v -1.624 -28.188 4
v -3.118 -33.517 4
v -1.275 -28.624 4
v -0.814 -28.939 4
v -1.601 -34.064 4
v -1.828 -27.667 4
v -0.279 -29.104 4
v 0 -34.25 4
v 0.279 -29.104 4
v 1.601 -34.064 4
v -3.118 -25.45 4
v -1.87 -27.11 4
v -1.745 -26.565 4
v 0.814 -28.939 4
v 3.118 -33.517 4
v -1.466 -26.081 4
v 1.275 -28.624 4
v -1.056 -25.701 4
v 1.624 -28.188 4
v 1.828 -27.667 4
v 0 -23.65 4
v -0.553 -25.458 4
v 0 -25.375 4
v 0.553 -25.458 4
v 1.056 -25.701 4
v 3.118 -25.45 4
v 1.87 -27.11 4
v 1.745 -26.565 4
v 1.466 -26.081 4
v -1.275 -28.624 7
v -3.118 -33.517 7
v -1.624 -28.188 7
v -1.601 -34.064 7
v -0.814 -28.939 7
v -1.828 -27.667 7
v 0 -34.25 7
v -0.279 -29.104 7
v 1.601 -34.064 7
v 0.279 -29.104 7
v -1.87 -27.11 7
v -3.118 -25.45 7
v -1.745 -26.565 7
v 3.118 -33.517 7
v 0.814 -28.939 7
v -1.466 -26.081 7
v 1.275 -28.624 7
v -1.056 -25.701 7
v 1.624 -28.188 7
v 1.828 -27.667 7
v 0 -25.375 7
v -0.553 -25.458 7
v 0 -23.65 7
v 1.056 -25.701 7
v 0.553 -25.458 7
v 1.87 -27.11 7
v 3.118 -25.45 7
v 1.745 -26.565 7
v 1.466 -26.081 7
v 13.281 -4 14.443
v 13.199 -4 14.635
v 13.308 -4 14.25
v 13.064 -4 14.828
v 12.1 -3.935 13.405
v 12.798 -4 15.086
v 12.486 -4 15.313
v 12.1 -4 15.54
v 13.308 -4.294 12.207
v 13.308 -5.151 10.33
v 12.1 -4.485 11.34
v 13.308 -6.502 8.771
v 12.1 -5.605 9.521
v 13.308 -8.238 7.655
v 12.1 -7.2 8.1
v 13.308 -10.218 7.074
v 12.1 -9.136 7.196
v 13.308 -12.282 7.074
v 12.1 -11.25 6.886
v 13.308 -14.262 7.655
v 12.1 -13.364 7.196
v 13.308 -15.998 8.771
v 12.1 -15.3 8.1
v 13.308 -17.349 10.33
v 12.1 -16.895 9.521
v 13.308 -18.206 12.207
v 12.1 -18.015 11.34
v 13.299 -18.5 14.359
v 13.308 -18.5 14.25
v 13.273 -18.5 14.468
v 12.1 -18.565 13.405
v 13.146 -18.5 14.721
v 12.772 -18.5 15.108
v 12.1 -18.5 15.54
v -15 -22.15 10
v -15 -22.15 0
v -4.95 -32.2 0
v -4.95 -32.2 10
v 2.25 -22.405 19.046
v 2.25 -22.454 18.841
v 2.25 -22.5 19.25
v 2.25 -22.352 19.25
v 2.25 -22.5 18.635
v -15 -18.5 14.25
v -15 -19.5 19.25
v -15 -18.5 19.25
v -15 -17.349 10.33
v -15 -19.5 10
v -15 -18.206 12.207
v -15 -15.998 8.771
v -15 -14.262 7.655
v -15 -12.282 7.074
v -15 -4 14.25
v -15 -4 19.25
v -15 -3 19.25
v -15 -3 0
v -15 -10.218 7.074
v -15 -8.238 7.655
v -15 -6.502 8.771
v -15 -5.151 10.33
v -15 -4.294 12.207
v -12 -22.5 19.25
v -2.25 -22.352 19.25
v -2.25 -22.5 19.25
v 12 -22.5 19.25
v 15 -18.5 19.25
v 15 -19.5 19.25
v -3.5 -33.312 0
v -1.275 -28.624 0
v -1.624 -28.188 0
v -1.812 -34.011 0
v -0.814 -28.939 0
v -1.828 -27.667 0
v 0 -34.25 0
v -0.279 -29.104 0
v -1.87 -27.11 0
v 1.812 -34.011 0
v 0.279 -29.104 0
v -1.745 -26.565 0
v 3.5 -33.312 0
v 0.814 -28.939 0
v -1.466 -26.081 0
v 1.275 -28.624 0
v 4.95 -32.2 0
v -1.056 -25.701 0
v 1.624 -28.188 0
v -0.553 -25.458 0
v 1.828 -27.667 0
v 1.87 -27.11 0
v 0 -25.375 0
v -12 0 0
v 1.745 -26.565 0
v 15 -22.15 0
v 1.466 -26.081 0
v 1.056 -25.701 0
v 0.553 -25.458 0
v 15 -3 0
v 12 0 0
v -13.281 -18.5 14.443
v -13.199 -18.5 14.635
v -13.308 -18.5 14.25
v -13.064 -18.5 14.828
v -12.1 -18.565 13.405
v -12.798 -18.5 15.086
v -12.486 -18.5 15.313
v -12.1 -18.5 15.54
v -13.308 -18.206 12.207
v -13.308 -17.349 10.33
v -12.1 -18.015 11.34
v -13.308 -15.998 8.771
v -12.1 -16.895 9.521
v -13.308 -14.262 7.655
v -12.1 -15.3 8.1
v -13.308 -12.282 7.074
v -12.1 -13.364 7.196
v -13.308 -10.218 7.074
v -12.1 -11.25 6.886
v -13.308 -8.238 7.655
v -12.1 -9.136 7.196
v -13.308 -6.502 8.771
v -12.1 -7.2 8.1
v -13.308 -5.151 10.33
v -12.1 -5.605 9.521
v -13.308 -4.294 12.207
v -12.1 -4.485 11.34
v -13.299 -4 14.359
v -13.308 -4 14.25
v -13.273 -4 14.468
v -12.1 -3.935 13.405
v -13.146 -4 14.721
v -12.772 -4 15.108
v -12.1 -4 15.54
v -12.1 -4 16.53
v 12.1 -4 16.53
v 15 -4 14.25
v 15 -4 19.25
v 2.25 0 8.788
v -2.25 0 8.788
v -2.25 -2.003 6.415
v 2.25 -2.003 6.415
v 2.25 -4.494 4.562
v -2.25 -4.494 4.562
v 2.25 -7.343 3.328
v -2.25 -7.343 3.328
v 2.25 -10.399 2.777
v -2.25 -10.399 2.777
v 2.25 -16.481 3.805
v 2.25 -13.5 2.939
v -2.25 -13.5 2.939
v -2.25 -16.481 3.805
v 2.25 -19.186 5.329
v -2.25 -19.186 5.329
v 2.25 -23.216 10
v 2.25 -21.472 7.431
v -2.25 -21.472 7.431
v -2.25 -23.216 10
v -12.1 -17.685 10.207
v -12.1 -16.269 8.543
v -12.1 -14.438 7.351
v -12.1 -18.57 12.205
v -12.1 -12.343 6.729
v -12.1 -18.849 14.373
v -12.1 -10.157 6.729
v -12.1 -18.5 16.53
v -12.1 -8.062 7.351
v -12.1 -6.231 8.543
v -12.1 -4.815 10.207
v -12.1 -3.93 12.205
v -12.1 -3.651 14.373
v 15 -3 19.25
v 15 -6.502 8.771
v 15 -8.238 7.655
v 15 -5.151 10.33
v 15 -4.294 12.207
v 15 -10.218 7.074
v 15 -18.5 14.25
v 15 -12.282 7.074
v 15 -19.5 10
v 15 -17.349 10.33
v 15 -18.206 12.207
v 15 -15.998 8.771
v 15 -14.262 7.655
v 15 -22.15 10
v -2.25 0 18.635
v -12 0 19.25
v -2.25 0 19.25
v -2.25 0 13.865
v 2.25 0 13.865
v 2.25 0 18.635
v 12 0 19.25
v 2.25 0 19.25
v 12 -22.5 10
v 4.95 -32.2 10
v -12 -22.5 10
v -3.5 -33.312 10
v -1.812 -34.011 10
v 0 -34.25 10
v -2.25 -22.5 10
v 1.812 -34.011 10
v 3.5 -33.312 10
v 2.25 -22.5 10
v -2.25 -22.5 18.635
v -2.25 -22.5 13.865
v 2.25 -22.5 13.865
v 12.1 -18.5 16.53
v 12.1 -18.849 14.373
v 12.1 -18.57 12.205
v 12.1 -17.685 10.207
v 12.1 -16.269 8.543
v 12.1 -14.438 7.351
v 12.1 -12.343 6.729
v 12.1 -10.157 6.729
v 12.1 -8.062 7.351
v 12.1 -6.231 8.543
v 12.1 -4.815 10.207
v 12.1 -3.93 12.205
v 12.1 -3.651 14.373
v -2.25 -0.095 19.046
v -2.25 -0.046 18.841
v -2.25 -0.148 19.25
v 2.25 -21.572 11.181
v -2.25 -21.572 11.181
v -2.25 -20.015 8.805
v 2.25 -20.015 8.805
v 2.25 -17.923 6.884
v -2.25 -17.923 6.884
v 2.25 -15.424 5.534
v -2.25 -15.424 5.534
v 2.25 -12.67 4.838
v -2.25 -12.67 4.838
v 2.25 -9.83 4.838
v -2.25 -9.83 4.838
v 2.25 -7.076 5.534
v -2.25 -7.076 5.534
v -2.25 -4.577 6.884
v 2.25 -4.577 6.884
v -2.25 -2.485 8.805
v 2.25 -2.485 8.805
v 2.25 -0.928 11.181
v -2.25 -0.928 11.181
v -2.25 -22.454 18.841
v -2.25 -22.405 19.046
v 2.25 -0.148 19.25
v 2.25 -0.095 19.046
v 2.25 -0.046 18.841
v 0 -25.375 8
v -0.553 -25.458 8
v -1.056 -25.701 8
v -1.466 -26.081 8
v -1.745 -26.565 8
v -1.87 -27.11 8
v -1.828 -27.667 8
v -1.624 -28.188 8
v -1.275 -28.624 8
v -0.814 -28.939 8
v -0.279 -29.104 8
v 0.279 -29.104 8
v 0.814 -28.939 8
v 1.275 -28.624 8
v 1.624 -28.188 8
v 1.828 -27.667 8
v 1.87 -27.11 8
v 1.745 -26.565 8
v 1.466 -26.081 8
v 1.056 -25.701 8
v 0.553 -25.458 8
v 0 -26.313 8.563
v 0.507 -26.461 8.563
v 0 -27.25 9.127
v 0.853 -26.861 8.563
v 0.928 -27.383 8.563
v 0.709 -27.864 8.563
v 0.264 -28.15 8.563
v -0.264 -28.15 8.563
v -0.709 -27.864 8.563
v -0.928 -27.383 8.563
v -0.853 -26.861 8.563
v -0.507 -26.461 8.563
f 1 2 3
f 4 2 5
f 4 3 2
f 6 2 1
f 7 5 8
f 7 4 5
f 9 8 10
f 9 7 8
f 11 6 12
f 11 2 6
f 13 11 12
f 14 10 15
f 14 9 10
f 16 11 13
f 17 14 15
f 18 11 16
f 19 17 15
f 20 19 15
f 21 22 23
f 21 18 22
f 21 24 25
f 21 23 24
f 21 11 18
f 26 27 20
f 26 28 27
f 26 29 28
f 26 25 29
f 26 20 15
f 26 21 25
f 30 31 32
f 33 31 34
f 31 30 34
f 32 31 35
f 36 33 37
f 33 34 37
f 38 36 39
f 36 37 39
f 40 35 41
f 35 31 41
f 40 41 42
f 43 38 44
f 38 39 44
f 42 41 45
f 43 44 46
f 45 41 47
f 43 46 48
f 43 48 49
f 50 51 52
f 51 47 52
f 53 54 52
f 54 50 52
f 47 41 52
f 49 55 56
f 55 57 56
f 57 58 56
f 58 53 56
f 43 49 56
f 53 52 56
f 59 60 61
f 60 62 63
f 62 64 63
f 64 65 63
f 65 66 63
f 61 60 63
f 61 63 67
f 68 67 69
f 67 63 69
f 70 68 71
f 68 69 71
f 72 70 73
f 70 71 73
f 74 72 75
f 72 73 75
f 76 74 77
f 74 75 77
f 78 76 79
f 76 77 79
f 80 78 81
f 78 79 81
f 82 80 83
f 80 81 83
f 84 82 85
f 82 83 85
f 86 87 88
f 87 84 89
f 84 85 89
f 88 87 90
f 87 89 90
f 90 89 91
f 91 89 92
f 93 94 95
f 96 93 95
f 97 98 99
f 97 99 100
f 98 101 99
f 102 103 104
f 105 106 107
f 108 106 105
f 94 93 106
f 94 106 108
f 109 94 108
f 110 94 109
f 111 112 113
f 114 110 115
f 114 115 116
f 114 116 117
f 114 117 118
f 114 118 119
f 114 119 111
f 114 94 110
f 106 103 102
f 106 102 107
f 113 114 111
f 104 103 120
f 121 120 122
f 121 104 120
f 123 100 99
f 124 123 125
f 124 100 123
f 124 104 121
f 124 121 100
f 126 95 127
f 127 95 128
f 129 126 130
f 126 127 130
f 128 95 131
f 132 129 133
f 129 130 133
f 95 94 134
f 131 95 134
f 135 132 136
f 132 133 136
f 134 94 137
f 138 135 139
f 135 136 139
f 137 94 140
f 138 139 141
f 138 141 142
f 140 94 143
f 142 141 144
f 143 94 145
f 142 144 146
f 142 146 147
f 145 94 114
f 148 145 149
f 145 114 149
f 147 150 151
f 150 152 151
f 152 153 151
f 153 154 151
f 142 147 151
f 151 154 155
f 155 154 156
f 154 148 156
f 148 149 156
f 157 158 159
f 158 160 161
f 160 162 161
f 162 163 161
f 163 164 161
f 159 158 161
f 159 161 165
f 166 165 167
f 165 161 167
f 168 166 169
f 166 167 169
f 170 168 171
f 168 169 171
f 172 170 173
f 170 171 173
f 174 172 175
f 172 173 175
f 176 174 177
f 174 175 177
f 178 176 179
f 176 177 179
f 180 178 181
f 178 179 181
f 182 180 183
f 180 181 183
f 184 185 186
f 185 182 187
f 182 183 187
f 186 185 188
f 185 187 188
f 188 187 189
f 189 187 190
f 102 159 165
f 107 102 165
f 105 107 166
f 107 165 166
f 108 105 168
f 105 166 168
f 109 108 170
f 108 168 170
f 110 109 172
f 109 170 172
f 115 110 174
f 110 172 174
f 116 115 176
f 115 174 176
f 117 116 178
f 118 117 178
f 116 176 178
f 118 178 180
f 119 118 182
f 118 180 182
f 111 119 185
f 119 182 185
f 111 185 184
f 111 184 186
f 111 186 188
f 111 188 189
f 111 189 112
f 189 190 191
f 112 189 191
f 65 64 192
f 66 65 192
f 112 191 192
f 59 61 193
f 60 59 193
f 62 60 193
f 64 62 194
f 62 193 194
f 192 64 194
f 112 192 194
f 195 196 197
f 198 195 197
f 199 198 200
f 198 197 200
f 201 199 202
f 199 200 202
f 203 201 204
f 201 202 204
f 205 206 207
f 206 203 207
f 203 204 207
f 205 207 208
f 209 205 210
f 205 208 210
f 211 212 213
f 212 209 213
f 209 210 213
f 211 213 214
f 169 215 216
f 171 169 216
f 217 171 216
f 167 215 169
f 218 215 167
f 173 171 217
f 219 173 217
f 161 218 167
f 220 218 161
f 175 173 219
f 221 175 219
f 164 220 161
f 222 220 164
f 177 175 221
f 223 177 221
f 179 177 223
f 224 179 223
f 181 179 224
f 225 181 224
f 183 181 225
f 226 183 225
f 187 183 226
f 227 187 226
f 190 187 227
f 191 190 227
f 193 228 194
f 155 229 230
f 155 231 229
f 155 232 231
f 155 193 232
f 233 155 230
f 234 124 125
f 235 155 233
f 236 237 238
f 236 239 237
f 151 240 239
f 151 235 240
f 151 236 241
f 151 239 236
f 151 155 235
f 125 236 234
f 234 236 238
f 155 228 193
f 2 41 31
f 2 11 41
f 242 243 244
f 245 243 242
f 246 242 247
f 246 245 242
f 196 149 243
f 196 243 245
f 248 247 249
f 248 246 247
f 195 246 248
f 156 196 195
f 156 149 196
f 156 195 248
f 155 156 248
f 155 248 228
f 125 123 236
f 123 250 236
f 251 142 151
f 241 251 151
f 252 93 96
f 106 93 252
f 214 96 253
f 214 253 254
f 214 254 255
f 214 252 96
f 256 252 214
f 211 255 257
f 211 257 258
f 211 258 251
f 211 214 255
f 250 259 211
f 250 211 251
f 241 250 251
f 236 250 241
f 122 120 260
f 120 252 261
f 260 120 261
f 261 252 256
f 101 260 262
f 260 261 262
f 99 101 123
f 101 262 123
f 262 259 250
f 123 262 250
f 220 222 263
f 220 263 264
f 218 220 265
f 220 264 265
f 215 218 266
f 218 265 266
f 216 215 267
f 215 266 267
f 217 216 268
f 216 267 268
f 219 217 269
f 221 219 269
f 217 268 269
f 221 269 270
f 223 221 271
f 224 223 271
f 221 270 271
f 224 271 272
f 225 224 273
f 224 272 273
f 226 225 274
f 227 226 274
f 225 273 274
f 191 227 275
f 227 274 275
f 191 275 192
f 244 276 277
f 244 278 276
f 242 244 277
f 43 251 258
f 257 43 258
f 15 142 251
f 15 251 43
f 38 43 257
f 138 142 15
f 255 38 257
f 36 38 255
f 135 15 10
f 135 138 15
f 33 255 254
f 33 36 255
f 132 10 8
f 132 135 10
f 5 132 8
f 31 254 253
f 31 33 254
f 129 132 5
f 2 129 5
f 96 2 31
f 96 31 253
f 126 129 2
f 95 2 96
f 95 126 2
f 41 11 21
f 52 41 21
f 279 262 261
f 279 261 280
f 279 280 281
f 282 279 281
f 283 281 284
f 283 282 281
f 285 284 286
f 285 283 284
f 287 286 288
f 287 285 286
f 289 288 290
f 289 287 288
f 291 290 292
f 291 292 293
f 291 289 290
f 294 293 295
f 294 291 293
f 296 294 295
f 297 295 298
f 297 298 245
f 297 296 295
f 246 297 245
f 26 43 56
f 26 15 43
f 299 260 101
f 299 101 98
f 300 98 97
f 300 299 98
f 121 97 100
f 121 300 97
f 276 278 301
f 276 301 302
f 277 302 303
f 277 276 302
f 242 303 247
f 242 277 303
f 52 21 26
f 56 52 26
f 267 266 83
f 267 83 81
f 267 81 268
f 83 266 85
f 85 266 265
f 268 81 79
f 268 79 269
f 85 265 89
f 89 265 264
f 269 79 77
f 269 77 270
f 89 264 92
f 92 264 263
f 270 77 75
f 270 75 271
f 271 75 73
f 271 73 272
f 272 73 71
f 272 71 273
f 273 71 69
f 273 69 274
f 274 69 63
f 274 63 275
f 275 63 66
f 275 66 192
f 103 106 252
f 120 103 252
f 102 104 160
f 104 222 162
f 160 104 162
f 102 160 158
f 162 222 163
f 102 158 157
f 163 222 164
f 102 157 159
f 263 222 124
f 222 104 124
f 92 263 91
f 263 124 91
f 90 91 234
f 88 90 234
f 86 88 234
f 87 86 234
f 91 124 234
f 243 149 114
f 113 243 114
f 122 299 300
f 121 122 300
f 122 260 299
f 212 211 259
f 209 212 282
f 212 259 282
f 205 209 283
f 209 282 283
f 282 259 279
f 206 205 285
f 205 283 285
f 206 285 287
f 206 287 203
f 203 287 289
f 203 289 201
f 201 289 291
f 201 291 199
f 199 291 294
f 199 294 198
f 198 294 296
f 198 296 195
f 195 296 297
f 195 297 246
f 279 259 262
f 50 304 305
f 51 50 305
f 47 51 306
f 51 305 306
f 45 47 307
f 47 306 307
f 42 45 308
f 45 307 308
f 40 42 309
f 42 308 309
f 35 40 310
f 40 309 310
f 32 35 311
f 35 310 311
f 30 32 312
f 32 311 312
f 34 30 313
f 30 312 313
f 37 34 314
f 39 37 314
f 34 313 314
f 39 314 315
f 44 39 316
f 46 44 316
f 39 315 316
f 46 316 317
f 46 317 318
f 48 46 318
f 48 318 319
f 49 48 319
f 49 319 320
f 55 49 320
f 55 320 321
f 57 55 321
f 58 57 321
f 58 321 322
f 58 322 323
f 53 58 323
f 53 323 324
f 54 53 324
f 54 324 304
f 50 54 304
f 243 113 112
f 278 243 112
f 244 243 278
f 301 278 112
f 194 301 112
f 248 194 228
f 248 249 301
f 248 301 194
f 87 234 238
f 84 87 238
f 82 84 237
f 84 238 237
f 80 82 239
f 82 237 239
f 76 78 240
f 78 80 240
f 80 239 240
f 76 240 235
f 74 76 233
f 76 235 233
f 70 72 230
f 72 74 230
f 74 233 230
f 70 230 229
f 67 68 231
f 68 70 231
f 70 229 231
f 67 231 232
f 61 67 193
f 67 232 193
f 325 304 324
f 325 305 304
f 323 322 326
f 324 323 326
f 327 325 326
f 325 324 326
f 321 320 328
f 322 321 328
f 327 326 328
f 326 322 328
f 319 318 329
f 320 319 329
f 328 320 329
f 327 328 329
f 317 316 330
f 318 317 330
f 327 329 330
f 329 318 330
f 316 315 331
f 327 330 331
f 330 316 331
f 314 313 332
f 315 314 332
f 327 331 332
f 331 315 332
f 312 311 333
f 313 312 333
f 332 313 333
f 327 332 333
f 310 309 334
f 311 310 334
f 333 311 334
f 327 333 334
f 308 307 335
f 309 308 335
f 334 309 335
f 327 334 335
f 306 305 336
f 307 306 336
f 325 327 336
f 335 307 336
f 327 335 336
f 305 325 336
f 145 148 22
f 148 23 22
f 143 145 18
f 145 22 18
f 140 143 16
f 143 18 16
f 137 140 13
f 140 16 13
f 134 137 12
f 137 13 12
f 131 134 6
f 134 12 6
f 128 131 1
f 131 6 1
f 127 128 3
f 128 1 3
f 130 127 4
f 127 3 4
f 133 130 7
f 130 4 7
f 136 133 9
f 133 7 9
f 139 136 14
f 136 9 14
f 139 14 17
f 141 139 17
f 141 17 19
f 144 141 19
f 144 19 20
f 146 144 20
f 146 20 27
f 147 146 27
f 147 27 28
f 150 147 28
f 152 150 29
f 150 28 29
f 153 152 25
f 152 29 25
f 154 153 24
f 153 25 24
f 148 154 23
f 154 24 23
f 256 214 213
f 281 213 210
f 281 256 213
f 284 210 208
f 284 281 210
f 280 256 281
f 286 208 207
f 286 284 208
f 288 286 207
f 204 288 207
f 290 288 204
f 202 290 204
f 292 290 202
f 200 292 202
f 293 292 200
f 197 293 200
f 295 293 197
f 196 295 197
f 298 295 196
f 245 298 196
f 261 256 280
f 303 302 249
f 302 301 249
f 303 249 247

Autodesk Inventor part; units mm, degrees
sketch "Boceto1" plane through (0, 0, 0) normal (0, 0, 1) x (1, 0, 0)
  line L0 (-12, 0) -> (12, 0)
  line L1 (15, -3) -> (15, -22.1495)
  line L2 (-15, -22.1495) -> (-15, -3)
  line L3 (12, 0) -> (15, -3)
  line L4 (-12, 0) -> (-15, -3)
  line L5 (-15, -22.1495) -> (-4.9497, -32.1997)
  arc A0 (-4.9497, -32.1997) -> (4.9497, -32.1997) centre (0, -27.25) ccw
  line L6 (4.9497, -32.1997) -> (15, -22.1495)
  point P0 (0, 0)
  point P1 (-15, 0)
  point P2 (15, 0)
  point P3 (0, 0)
  point P4 (0, -34.25)
  point P5 (15, 0)
  point P6 (0, -34.25)
  dimension "d0" = 30
  dimension "d5" = 3
  dimension "d6" = 3
  dimension "d10" = 135
  dimension "d55" = 27.25
  dimension "d59" = 7
  dimension "d60" = 34.25
extrude "Extrusión1" add sketch "Boceto1" along normal blind 10
sketch "Boceto2" plane through (0, 0, 10) normal (0, 0, 1) x (1, 0, 0)
  line L0 (15, -22.1495) -> (15, -3) projected
  line L1 (15, -3) -> (12, 0) projected
  line L2 (12, 0) -> (-12, 0) projected
  line L3 (-12, 0) -> (-15, -3) projected
  line L4 (-15, -3) -> (-15, -22.1495) projected
  line L5 (-15, -22.1495) -> (-4.9497, -32.1997) projected
  arc A0 (-4.9497, -32.1997) -> (4.9497, -32.1997) centre (0, -27.25) ccw projected
  line L6 (4.9497, -32.1997) -> (15, -22.1495) projected
  line L7 (-15, -19.5) -> (-12, -22.5)
  line L8 (-12, -22.5) -> (12, -22.5)
  line L9 (12, -22.5) -> (15, -19.5)
  point P0 (0, 0)
  dimension "d13" = 3
  dimension "d14" = 3
  dimension "d15" = 3
  dimension "d16" = 3
  dimension "d17" = 22.5
extrude "Extrusión2" add sketch "Boceto2" along normal blind 9.25 contours L9 L8 L7 L4 L3 L2 L1 L0
sketch "Boceto3" plane through (15, -22.1495, 0) normal (1, 0, 0) x (0, 0, -1)
  line L0 (-19.25, 2.6495) -> (-19.25, 19.1495) projected
  line L1 (-19.25, 19.1495) -> (-19.25, 2.6495) projected
  line L2 (-19.25, 3.6495) -> (-14.25, 3.6495)
  arc A0 (-14.25, 3.6495) -> (-14.25, 18.1495) centre (-14.25, 10.8995) ccw
  line L3 (-14.25, 18.1495) -> (-19.25, 18.1495)
  point P0 (0, 22.1495)
  point P1 (-7, 10.8995)
  point P2 (-19.25, 10.8995)
  dimension "d20" = 12.25
  dimension "d21" = 14.5
extrude "Extrusión3" cut sketch "Boceto3" against normal through all
hole "Agujero1" at (0, -27.25, 0) direction (0, 0, 1) diameter 3.75 depth 8 tip angle 118
ref_plane "Plano de trabajo1" through (0, 0, 4) normal (0, 0, 1) x (1, 0, 0)
sketch "Boceto4" plane through (0, 0, 4) normal (0, 0, 1) x (1, 0, 0)
  circle A0 centre (0, -27.25) radius 1.875 projected
  line L0 (0, -23.6502) -> (3.1175, -25.4501)
  line L1 (3.1175, -25.4501) -> (3.1175, -29.0499)
  line L2 (-3.1175, -29.0499) -> (-3.1175, -25.4501)
  line L3 (-3.1175, -25.4501) -> (0, -23.6502)
  line L4 (-3.1175, -29.0499) -> (-3.1175, -35.0499)
  line L5 (-3.1175, -35.0499) -> (3.1175, -35.0499)
  line L6 (3.1175, -35.0499) -> (3.1175, -29.0499)
  point P0 (0, 0)
  point P1 (0, -27.25)
  dimension "d36" = 6.235
  dimension "d37" = 6
extrude "Extrusión4" cut sketch "Boceto4" along normal blind 3
sketch "Boceto5" plane through (0, 0, 0) normal (1, 0, 0) x (0, 1, 0)
  arc A0 (-18.5, 14.25) -> (-4, 14.25) centre (-11.25, 14.25) ccw projected
  circle A1 centre (-11.25, 16.25) radius 11.5
  circle A2 centre (-11.25, 16.25) radius 13.5
  point P0 (0, 0)
  dimension "d44" = 27
  dimension "d45" = 23
  dimension "d46" = 2
extrude "Extrusión5" cut sketch "Boceto5" along normal mid plane 4.5
sketch "Boceto6" plane through (0, 0, 0) normal (1, 0, 0) x (0, 1, 0)
  line L0 (-18.5, 19.25) -> (-19.5, 19.25) projected
  arc A0 (-18.5, 14.25) -> (-4, 14.25) centre (-11.25, 14.25) ccw projected
  circle A1 centre (-11.25, 14.25) radius 7.6
  point P0 (0, 0)
  dimension "d49" = 15.2
extrude "Extrusión6" cut sketch "Boceto6" along normal mid plane 24.2
ref_plane "Plano de trabajo2" through (15, -11.25, 14.25) normal (0, -1, 0) x (1, 0, 0)
sketch "Boceto7" plane through (15, -11.25, 14.25) normal (0, -1, 0) x (1, 0, 0)
  line L0 (-10.0503, -14.25) -> (0, -14.25) projected
  line L1 (0, -14.25) -> (0, -4.25) projected
  line L2 (-10.0503, -4.25) -> (0, -4.25) projected
  line L3 (-10.0503, -14.25) -> (-10.0503, -4.25) projected
  line L4 (-2.9, -7.6) -> (-2.9, 2.2798) projected
  line L5 (-2.9, 0) -> (-2.9, 0) projected
  line L6 (0, 0) -> (-2.9, 0) projected
  line L7 (0, 0) -> (0, 0) projected
  line L8 (0, 0) -> (-2.9, 0) projected
  line L9 (-2.9, -7.3639) -> (-1.67, -7.2479)
  line L10 (-1.67, -7.2479) -> (-2.9, -7.2479)
  line L11 (-2.9, -7.3639) -> (-2.9, -7.2479)
  point P0 (-15, -14.25)
  dimension "d52" = 0.116
  dimension "d53" = 1.23
revolve "Revolución1" cut sketch "Boceto7" angle 360 about axis through (15, -11.25, 14.25) along (-1, 0, 0) contours L10 L9 L4
mirror "Simetría1" about plane through (0, 0, 0) normal (1, 0, 0) of "Revolución1"
equation "\"d6\" = d5"
